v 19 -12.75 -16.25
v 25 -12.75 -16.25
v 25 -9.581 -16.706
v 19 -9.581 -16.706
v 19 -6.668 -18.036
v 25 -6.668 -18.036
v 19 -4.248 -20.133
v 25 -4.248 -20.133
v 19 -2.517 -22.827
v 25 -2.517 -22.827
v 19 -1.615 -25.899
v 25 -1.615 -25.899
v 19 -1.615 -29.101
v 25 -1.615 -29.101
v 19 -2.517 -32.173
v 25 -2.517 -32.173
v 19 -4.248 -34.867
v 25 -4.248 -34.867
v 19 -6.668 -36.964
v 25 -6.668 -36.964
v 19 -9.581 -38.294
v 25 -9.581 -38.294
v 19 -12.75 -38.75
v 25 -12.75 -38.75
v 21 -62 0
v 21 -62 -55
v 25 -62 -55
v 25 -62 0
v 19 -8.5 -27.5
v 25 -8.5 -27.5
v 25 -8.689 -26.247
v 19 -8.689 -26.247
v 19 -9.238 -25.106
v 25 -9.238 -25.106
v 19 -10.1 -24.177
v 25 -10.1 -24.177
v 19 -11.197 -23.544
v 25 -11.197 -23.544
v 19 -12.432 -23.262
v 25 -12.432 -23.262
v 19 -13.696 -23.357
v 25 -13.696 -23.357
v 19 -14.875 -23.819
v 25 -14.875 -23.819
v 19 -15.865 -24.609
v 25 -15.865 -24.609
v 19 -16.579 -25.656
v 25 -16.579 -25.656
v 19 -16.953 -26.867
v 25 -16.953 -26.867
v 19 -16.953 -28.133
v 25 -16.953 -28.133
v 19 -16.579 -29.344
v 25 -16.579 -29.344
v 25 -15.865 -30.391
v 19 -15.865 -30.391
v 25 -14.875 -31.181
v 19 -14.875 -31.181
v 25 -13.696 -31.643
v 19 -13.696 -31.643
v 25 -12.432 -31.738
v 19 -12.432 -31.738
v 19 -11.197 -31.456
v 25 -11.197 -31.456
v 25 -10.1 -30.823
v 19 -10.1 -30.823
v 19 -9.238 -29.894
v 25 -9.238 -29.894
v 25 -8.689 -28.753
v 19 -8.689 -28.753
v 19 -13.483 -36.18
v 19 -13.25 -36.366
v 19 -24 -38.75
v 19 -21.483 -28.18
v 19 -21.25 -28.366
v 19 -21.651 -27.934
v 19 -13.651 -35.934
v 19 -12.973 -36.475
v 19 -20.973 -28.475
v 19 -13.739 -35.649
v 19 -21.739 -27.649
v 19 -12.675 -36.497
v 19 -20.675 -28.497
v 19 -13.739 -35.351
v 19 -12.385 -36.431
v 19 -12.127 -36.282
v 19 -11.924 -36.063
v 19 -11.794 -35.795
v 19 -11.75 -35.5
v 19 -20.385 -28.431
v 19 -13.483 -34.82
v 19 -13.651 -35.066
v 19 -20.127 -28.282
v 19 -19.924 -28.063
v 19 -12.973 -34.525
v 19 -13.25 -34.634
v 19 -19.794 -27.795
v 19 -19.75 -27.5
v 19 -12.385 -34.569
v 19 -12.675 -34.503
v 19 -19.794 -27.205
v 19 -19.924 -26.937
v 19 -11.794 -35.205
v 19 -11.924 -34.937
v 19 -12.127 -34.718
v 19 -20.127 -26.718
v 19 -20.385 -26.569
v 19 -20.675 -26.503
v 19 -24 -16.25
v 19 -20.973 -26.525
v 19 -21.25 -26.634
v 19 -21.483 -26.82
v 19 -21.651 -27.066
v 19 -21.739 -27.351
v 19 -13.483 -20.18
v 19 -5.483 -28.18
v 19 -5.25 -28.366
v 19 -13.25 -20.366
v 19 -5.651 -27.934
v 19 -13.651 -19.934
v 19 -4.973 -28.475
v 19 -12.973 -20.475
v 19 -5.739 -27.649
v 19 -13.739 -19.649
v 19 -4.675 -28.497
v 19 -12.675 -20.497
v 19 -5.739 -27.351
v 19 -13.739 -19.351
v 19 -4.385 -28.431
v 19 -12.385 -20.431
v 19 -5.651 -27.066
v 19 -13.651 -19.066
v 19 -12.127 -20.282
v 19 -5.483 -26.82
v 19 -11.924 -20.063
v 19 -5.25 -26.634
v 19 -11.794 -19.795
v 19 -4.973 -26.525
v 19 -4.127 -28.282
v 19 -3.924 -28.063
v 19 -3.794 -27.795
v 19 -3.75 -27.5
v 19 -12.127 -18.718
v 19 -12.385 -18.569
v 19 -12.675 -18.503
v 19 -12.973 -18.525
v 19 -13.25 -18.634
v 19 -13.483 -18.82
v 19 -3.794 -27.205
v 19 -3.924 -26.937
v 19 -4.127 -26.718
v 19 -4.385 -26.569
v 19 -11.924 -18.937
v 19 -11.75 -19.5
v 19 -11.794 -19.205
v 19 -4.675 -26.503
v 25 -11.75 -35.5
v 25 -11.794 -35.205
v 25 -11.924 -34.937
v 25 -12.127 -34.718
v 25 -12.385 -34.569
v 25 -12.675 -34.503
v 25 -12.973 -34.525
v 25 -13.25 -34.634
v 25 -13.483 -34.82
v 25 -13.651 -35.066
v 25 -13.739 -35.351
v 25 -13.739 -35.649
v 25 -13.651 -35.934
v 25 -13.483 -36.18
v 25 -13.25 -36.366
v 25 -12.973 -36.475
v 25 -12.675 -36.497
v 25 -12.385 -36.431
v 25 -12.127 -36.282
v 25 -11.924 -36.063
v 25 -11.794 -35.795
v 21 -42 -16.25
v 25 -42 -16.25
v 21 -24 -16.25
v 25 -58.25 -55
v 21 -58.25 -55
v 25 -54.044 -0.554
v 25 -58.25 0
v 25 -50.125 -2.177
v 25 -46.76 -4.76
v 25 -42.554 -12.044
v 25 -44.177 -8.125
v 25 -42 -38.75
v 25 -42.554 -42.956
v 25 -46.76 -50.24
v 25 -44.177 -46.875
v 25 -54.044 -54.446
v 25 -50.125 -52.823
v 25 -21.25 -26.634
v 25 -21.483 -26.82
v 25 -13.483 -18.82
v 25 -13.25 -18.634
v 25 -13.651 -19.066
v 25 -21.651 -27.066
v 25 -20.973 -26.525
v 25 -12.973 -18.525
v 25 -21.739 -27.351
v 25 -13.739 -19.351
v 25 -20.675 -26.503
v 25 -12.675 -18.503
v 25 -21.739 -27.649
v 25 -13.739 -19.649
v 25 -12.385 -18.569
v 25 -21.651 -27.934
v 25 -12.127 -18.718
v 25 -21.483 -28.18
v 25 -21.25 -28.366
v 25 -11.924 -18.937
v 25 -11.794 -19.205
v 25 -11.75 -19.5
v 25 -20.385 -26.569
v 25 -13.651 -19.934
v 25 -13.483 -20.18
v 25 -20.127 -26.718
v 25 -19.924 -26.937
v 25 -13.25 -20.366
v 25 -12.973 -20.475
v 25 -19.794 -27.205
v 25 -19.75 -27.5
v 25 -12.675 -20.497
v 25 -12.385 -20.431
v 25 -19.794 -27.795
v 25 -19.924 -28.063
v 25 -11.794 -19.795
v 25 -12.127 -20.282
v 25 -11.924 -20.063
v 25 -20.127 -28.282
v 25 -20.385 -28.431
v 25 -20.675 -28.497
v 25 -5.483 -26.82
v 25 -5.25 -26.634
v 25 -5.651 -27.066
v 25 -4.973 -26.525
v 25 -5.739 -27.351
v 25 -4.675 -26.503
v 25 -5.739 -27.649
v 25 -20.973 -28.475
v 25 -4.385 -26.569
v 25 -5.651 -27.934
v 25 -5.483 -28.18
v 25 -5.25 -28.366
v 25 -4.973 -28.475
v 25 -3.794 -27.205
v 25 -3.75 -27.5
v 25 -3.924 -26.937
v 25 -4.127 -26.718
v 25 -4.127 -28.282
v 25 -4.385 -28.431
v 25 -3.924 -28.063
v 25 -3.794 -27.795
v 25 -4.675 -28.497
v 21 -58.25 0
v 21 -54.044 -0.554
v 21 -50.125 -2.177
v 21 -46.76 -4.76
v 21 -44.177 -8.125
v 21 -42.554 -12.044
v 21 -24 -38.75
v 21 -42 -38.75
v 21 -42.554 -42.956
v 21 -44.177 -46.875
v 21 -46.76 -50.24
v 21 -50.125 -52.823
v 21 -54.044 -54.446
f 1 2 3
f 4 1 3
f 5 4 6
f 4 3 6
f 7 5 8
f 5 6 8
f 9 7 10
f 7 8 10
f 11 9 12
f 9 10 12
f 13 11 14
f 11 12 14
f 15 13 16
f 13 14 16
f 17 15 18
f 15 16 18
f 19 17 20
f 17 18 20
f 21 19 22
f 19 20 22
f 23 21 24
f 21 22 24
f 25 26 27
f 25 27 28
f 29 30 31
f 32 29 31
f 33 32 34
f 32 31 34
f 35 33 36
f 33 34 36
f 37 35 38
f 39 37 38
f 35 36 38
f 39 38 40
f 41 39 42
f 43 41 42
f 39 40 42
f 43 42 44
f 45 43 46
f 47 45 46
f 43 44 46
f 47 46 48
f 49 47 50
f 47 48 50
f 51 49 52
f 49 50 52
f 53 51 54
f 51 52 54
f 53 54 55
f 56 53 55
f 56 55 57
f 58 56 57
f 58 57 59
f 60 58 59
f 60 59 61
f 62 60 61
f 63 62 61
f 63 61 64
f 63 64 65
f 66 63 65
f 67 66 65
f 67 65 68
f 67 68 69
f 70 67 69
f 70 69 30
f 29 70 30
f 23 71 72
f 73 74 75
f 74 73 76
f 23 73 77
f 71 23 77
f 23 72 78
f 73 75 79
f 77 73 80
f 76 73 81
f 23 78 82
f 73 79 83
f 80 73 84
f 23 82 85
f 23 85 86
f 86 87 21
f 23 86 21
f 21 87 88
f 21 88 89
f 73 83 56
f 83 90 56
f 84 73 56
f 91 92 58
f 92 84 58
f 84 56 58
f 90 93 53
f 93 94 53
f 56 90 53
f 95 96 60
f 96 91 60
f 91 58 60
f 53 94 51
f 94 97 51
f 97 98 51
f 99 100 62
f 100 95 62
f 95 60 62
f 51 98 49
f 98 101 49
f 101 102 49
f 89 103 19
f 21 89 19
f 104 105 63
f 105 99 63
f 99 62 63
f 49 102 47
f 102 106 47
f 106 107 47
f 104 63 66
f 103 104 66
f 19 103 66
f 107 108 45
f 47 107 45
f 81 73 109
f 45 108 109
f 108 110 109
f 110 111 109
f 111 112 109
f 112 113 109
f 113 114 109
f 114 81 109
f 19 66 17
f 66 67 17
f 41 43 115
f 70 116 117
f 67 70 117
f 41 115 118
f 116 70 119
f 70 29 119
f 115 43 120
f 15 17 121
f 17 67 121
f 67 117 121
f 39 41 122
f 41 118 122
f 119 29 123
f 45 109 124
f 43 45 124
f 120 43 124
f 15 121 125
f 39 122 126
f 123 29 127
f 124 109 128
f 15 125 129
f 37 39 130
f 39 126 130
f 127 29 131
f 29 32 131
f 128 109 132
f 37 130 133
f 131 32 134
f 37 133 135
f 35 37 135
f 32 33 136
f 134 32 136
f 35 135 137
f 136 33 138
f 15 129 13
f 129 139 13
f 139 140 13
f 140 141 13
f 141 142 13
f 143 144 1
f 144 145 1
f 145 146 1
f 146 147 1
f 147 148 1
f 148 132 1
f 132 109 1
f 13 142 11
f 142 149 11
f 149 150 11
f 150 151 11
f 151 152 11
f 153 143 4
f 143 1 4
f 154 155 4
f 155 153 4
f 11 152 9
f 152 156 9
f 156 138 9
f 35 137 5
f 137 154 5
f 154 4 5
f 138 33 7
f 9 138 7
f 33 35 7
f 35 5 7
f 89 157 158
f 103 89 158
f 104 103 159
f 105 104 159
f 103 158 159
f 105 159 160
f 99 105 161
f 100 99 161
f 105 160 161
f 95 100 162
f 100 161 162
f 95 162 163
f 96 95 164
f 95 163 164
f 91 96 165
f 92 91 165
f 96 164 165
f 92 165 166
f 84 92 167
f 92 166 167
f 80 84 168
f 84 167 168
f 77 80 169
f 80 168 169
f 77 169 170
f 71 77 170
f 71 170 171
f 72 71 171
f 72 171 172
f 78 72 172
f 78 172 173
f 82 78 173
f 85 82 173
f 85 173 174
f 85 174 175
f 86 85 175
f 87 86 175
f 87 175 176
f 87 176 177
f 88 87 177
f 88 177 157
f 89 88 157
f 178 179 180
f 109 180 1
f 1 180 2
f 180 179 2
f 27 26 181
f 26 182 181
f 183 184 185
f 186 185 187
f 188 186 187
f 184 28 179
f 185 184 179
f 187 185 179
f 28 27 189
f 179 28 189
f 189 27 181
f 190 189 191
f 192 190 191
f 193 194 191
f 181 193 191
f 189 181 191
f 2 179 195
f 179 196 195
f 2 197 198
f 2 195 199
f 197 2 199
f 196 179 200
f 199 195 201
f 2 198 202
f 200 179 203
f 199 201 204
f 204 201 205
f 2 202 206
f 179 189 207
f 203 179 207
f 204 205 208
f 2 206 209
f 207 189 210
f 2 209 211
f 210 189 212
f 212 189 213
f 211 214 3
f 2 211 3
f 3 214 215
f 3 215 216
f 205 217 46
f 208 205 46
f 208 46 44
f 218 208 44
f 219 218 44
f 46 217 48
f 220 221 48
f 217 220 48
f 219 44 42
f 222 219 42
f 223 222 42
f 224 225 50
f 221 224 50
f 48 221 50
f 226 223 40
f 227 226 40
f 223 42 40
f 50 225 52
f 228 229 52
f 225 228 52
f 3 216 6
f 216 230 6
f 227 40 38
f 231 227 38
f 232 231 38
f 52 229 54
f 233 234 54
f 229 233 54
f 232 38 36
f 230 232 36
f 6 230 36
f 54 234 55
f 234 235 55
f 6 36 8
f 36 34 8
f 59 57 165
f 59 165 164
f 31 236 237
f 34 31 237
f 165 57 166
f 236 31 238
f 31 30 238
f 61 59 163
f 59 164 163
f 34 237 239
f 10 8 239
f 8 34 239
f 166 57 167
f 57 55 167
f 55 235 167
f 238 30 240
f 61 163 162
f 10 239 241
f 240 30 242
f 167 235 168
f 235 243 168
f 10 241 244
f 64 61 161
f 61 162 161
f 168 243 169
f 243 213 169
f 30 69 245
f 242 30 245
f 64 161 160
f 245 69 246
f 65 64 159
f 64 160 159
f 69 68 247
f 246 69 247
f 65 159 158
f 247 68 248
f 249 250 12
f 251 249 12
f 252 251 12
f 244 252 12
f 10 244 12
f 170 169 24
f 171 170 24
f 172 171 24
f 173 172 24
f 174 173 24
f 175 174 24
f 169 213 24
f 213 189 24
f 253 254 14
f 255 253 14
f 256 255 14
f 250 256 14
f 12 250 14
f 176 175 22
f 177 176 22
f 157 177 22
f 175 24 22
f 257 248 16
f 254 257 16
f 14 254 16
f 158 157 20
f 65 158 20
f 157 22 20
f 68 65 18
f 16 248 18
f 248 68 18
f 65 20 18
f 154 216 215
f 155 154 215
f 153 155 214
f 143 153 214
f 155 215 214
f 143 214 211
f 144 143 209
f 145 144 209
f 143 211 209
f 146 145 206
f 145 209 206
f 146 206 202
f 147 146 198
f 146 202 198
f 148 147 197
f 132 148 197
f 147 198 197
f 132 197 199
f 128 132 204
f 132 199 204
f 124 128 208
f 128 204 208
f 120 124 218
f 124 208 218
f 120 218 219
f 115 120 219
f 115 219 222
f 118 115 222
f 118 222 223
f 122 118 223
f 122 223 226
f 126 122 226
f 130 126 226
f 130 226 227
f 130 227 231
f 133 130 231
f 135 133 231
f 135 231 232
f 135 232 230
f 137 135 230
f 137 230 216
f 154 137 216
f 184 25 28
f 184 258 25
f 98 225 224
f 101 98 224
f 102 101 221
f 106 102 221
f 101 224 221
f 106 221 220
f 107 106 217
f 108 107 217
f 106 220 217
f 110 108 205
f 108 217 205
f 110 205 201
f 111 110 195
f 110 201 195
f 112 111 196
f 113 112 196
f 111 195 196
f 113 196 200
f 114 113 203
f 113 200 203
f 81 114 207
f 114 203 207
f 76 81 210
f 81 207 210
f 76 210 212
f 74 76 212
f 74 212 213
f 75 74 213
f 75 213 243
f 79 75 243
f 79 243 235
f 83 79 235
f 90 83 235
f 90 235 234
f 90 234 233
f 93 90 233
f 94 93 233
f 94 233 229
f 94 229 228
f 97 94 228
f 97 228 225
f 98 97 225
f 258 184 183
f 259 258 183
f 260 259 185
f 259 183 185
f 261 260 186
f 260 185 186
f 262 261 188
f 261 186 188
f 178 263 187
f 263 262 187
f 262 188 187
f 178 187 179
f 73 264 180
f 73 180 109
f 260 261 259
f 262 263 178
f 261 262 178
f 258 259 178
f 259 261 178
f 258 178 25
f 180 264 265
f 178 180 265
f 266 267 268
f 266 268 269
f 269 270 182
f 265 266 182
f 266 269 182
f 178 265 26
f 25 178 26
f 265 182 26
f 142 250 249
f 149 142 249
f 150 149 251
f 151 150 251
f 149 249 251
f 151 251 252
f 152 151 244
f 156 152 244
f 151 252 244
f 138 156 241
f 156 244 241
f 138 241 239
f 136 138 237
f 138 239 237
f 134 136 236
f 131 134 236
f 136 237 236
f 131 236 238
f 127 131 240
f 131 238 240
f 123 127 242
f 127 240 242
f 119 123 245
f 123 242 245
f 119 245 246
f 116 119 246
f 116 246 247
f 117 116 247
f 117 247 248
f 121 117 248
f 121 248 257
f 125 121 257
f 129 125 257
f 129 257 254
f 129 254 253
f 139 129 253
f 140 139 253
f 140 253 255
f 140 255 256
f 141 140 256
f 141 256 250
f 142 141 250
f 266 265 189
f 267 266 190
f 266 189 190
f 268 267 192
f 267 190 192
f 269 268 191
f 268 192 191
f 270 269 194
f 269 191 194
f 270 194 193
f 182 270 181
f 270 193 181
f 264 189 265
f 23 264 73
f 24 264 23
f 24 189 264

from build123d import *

# Parameters (mm, degrees)
SKETCH1_W           = 50
SKETCH1_H           = 170
BOSS_EXTRUDE1_DEPTH = 55
SKETCH2_W           = 34
SKETCH2_H           = 27
CUT_EXTRUDE1_DEPTH  = 181.416185527
SKETCH3_W           = 10
SKETCH3_H           = 24
SKETCH3_R           = 4.25
SKETCH3_R_2         = 1
CUT_EXTRUDE2_DEPTH  = 186.539753153
SKETCH4_W           = 2
SKETCH4_H           = 24
CUT_EXTRUDE3_DEPTH  = 178.623196683
SKETCH5_W           = 6.25
SKETCH5_H           = 11.25
CUT_EXTRUDE4_DEPTH  = 186.539753153
SKETCH6_W           = 38
SKETCH6_H           = 10
CUT_EXTRUDE5_DEPTH  = 181.416185527
SKETCH8_W           = 13.25
SKETCH8_H           = 2.25
CUT_EXTRUDE7_DEPTH  = 186.539753153
SKETCH9_W           = 34
SKETCH9_H           = 35.25
CUT_EXTRUDE8_DEPTH  = 179.297679458
SKETCH11_W          = 13.25
SKETCH11_H          = 20.25
CUT_EXTRUDE9_DEPTH  = 184.480414486
SKETCH12_W          = 28.5
SKETCH12_H          = 15
BOSS_EXTRUDE2_DEPTH = 8
SKETCH14_W          = 34
SKETCH14_H          = 15
SKETCH14_H_2        = 10.25
BOSS_EXTRUDE3_DEPTH = 13.25
SKETCH16_R          = 4.5
SKETCH16_R_2        = 2.5
CUT_EXTRUDE13_DEPTH = 8
SKETCH17_W          = 16.25
SKETCH17_H          = 18
CUT_EXTRUDE14_DEPTH = 175.384811552
CUT_EXTRUDE15_DEPTH = 175.384811552
SKETCH20_W          = 42
SKETCH20_H          = 6.25
SKETCH20_H_2        = 18
SKETCH20_H_3        = 58.75
CUT_EXTRUDE18_DEPTH = 169.923244404
SKETCH22_R          = 4.5
SKETCH22_R_2        = 1.45
BOSS_EXTRUDE4_DEPTH = 8
SKETCH23_W          = 2
SKETCH23_H          = 10
CUT_EXTRUDE19_DEPTH = 165.352137193
FILLET1_R           = 10
SKETCH24_W          = 55
SKETCH24_H          = 55
CUT_EXTRUDE20_DEPTH = 175.384811552
SKETCH25_W          = 85.852144446
SKETCH25_H          = 76.221294909
CUT_EXTRUDE21_DEPTH = 175.384811552
SKETCH26_W          = 33.011757796
SKETCH26_H          = 68.674094685
CUT_EXTRUDE22_DEPTH = 87.567892431


with BuildPart() as part:
    # Sketch1 → Boss-Extrude1 (new body)
    with BuildSketch(Plane.XY):
        with Locations((0, -85)):
            Rectangle(SKETCH1_W, SKETCH1_H)
    extrude(amount=-BOSS_EXTRUDE1_DEPTH)

    # Sketch2 → Cut-Extrude1 (cut, through all)
    with BuildSketch(Plane.XY):
        with Locations((0, -13.5)):
            Rectangle(SKETCH2_W, SKETCH2_H)
    extrude(amount=-CUT_EXTRUDE1_DEPTH, mode=Mode.SUBTRACT)

    # Sketch3 → Cut-Extrude2 (cut, through all)
    with BuildSketch(Plane(origin=(25, 0, 0), x_dir=(0, 0, -1), z_dir=(1, 0, 0))):
        with Locations((50, -12)):
            Rectangle(SKETCH3_W, SKETCH3_H)
        with Locations((5, -12)):
            Rectangle(SKETCH3_W, SKETCH3_H)
        with Locations(Location((27.5, -12.75, 0), (0, 0, 90))):
            Circle(SKETCH3_R)
        with Locations(Location((35.5, -12.75, 0), (0, 0, 90))):
            Circle(SKETCH3_R_2)
        with Locations(Location((27.5, -4.75, 0), (0, 0, 90))):
            Circle(SKETCH3_R_2)
        with Locations(Location((27.5, -20.75, 0), (0, 0, 90))):
            Circle(SKETCH3_R_2)
        with Locations(Location((19.5, -12.75, 0), (0, 0, 90))):
            Circle(SKETCH3_R_2)
    extrude(amount=-CUT_EXTRUDE2_DEPTH, mode=Mode.SUBTRACT)

    # Sketch4 → Cut-Extrude3 (cut, through all)
    with BuildSketch(Plane.XY.offset(-10)):
        with Locations((-18, -12)):
            Rectangle(SKETCH4_W, SKETCH4_H)
        with Locations((18, -12)):
            Rectangle(SKETCH4_W, SKETCH4_H)
    extrude(amount=-CUT_EXTRUDE3_DEPTH, mode=Mode.SUBTRACT)

    # Sketch5 → Cut-Extrude4 (cut, through all)
    with BuildSketch(Plane(origin=(25, 0, 0), x_dir=(0, 0, -1), z_dir=(1, 0, 0))):
        with BuildLine():
            Line((45, 0), (10, 0))
            Line((10, 0), (10, -12.75))
            Line((10, -12.75), (16.25, -12.75))
            ThreePointArc((16.25, -12.75), (27.5, -1.5), (38.75, -12.75))
            Line((38.75, -12.75), (45, -12.75))
            Line((45, -12.75), (45, 0))
        make_face()
        with Locations((13.125, -18.375)):
            Rectangle(SKETCH5_W, SKETCH5_H)
        with Locations((41.875, -18.375)):
            Rectangle(SKETCH5_W, SKETCH5_H)
    extrude(amount=-CUT_EXTRUDE4_DEPTH, mode=Mode.SUBTRACT)

    # Sketch6 → Cut-Extrude5 (cut, through all)
    with BuildSketch(Plane.XY):
        with Locations((0, -29)):
            Rectangle(SKETCH6_W, SKETCH6_H)
    extrude(amount=-CUT_EXTRUDE5_DEPTH, mode=Mode.SUBTRACT)

    # Sketch8 → Cut-Extrude7 (cut, through all)
    with BuildSketch(Plane(origin=(25, 0, 0), x_dir=(0, 0, -1), z_dir=(1, 0, 0))):
        with BuildLine():
            Line((27.5, -157.5), (27.5, -132.5))
            Line((27.5, -132.5), (13.25, -132.5))
            Line((13.25, -132.5), (13.25, -167.75))
            Line((13.25, -167.75), (17.25, -167.75))
            ThreePointArc((17.25, -167.75), (20.252155493, -160.502155493), (27.5, -157.5))
        make_face()
        with BuildLine():
            Line((41.75, -167.75), (41.75, -132.5))
            Line((41.75, -132.5), (27.5, -132.5))
            Line((27.5, -132.5), (27.5, -157.5))
            ThreePointArc((27.5, -157.5), (34.747844507, -160.502155493), (37.75, -167.75))
            Line((37.75, -167.75), (41.75, -167.75))
        make_face()
        with Locations((48.375, -168.875)):
            Rectangle(SKETCH8_W, SKETCH8_H)
        with Locations((6.625, -168.875)):
            Rectangle(SKETCH8_W, SKETCH8_H)
        with BuildLine():
            Line((17.25, -167.75), (13.25, -167.75))
            Line((13.25, -167.75), (13.25, -170))
            Line((13.25, -170), (17.5, -170))
            ThreePointArc((17.5, -170), (17.31269172, -168.881923142), (17.25, -167.75))
        make_face()
        with BuildLine():
            Line((41.75, -170), (41.75, -167.75))
            Line((41.75, -167.75), (37.75, -167.75))
            ThreePointArc((37.75, -167.75), (37.68730828, -168.881923142), (37.5, -170))
            Line((37.5, -170), (41.75, -170))
        make_face()
        with BuildLine():
            Line((27.5, -167.75), (27.5, -157.5))
            ThreePointArc((27.5, -157.5), (20.252155493, -160.502155493), (17.25, -167.75))
            Line((17.25, -167.75), (27.5, -167.75))
        make_face()
        with BuildLine():
            ThreePointArc((37.75, -167.75), (34.747844507, -160.502155493), (27.5, -157.5))
            Line((27.5, -157.5), (27.5, -167.75))
            Line((27.5, -167.75), (37.75, -167.75))
        make_face()
        with BuildLine():
            Line((27.5, -170), (27.5, -167.75))
            Line((27.5, -167.75), (17.25, -167.75))
            ThreePointArc((17.25, -167.75), (17.31269172, -168.881923142), (17.5, -170))
            Line((17.5, -170), (27.5, -170))
        make_face()
        with BuildLine():
            ThreePointArc((37.5, -170), (37.68730828, -168.881923142), (37.75, -167.75))
            Line((37.75, -167.75), (27.5, -167.75))
            Line((27.5, -167.75), (27.5, -170))
            Line((27.5, -170), (37.5, -170))
        make_face()
    extrude(amount=-CUT_EXTRUDE7_DEPTH, mode=Mode.SUBTRACT)

    # Sketch9 → Cut-Extrude8 (cut, through all)
    with BuildSketch(Plane.XY):
        with Locations((0, -150.125)):
            Rectangle(SKETCH9_W, SKETCH9_H)
    extrude(amount=-CUT_EXTRUDE8_DEPTH, mode=Mode.SUBTRACT)

    # Sketch11 → Cut-Extrude9 (cut, through all)
    with BuildSketch(Plane(origin=(25, 0, 0), x_dir=(0, 0, -1), z_dir=(1, 0, 0))):
        with BuildLine():
            ThreePointArc((17.25, -167.75), (20.252155493, -160.502155493), (27.5, -157.5))
            Line((27.5, -157.5), (27.5, -147.5))
            Line((27.5, -147.5), (13.25, -147.5))
            Line((13.25, -147.5), (13.25, -167.75))
            Line((13.25, -167.75), (17.25, -167.75))
        make_face()
        with BuildLine():
            Line((27.5, -147.5), (27.5, -157.5))
            ThreePointArc((27.5, -157.5), (34.747844507, -160.502155493), (37.75, -167.75))
            Line((37.75, -167.75), (41.75, -167.75))
            Line((41.75, -167.75), (41.75, -147.5))
            Line((41.75, -147.5), (27.5, -147.5))
        make_face()
        with Locations((48.375, -157.625)):
            Rectangle(SKETCH11_W, SKETCH11_H)
        with Locations((6.625, -157.625)):
            Rectangle(SKETCH11_W, SKETCH11_H)
    extrude(amount=-CUT_EXTRUDE9_DEPTH, mode=Mode.SUBTRACT)

    # Sketch12 → Boss-Extrude2 (add)
    with BuildSketch(Plane(origin=(25, 0, 0), x_dir=(0, 0, -1), z_dir=(1, 0, 0))):
        with Locations((27.5, -140)):
            Rectangle(SKETCH12_W, SKETCH12_H)
    boss_extrude2 = extrude(amount=-BOSS_EXTRUDE2_DEPTH)

    # Mirror1: Boss-Extrude2 across plane
    add(boss_extrude2.mirror(Plane(origin=(0, 0, 0), x_dir=(0, 0, 1), z_dir=(1, 0, 0))))

    # Sketch14 → Boss-Extrude3 (add)
    with BuildSketch(Plane.XY):
        with Locations((0, -140)):
            Rectangle(SKETCH14_W, SKETCH14_H)
        with Locations((0, -152.625)):
            Rectangle(SKETCH14_W, SKETCH14_H_2)
    boss_extrude3 = extrude(amount=-BOSS_EXTRUDE3_DEPTH)

    # Mirror2: Boss-Extrude3 across plane
    add(boss_extrude3.mirror(Plane.XY.offset(-27.5)))

    # Sketch16 → Cut-Extrude13 (cut)
    # profile 1 of 3: a face of its own
    with BuildSketch(Plane(origin=(25, 0, 0), x_dir=(0, 0, -1), z_dir=(1, 0, 0))):
        with Locations(Location((16.5, -135.75, 0), (0, 0, 90))):
            Circle(SKETCH16_R)
        with Locations((16.5, -135.75)):
            Circle(SKETCH16_R_2, mode=Mode.SUBTRACT)
    # profile 2 of 3: a face of its own
    with BuildSketch(Plane(origin=(25, 0, 0), x_dir=(0, 0, -1), z_dir=(1, 0, 0))):
        with Locations((16.5, -135.75)):
            Circle(SKETCH16_R_2)
    # profile 3 of 3: a face of its own
    with BuildSketch(Plane(origin=(25, 0, 0), x_dir=(0, 0, -1), z_dir=(1, 0, 0))):
        with Locations(Location((38.5, -135.75, 0), (0, 0, 90))):
            Circle(SKETCH16_R)
    cut_extrude13 = extrude(amount=-CUT_EXTRUDE13_DEPTH, mode=Mode.SUBTRACT)

    # Mirror3: Cut-Extrude13 across plane
    add(cut_extrude13.mirror(Plane(origin=(0, 0, 0), x_dir=(0, 0, 1), z_dir=(1, 0, 0))), mode=Mode.SUBTRACT)

    # Sketch17 → Cut-Extrude14 (cut, through all)
    with BuildSketch(Plane(origin=(25, 0, 0), x_dir=(0, 0, -1), z_dir=(1, 0, 0))):
        with Locations((46.875, -33)):
            Rectangle(SKETCH17_W, SKETCH17_H)
        with Locations((8.125, -33)):
            Rectangle(SKETCH17_W, SKETCH17_H)
    extrude(amount=-CUT_EXTRUDE14_DEPTH, mode=Mode.SUBTRACT)

    # Sketch18 → Cut-Extrude15 (cut, through all)
    with BuildSketch(Plane(origin=(25, 0, 0), x_dir=(0, 0, -1), z_dir=(1, 0, 0))):
        with BuildLine():
            ThreePointArc((0, -58.25), (4.759514806, -46.759514806), (16.25, -42))
            Line((16.25, -42), (0, -42))
            Line((0, -42), (0, -58.25))
        make_face()
        with BuildLine():
            Line((55, -42), (38.75, -42))
            ThreePointArc((38.75, -42), (50.240485194, -46.759514806), (55, -58.25))
            Line((55, -58.25), (55, -42))
        make_face()
    extrude(amount=-CUT_EXTRUDE15_DEPTH, mode=Mode.SUBTRACT)

    # Sketch20 → Cut-Extrude18 (cut, through all)
    with BuildSketch(Plane(origin=(0, 0, -55), x_dir=(-1, 0, 0), z_dir=(0, 0, -1))):
        with Locations((0, -55.125)):
            Rectangle(SKETCH20_W, SKETCH20_H)
        with Locations((0, -43)):
            Rectangle(SKETCH20_W, SKETCH20_H_2)
        with Locations((0, -87.625)):
            Rectangle(SKETCH20_W, SKETCH20_H_3)
    extrude(amount=-CUT_EXTRUDE18_DEPTH, mode=Mode.SUBTRACT)

    # Sketch22 → Boss-Extrude4 (add)
    # profile 1 of 2: a face of its own
    with BuildSketch(Plane.ZY.offset(25)):
        with Locations(Location((-38.5, -135.75, 0), (0, 0, 90))):
            Circle(SKETCH22_R)
        with Locations(Location((-38.5, -135.75, 0), (0, 0, 270))):
            Circle(SKETCH22_R_2, mode=Mode.SUBTRACT)
    # profile 2 of 2: a face of its own
    with BuildSketch(Plane.ZY.offset(25)):
        with Locations(Location((-16.5, -135.75, 0), (0, 0, 90))):
            Circle(SKETCH22_R)
        with Locations(Location((-16.5, -135.75, 0), (0, 0, 270))):
            Circle(SKETCH22_R_2, mode=Mode.SUBTRACT)
    boss_extrude4 = extrude(amount=-BOSS_EXTRUDE4_DEPTH)

    # Mirror4: Boss-Extrude4 across plane
    add(boss_extrude4.mirror(Plane(origin=(0, 0, 0), x_dir=(0, 0, 1), z_dir=(1, 0, 0))))

    # Sketch23 → Cut-Extrude19 (cut, through all)
    with BuildSketch(Plane(origin=(0, 0, -38.75), x_dir=(-1, 0, 0), z_dir=(0, 0, -1))):
        with Locations((-20, -29)):
            Rectangle(SKETCH23_W, SKETCH23_H)
        with Locations((20, -29)):
            Rectangle(SKETCH23_W, SKETCH23_H)
    extrude(amount=-CUT_EXTRUDE19_DEPTH, mode=Mode.SUBTRACT)

    # Fillet1
    fillet1_edges = [part.edges().sort_by_distance(p)[0] for p in [
        (0, -157.75, 0),
        (0, -157.75, -55),
    ]]
    fillet(fillet1_edges, radius=FILLET1_R)

    # Sketch24 → Cut-Extrude20 (cut, through all)
    with BuildSketch(Plane.ZY.offset(25)):
        with Locations((-27.5, -89.5)):
            Rectangle(SKETCH24_W, SKETCH24_H)
    extrude(amount=-CUT_EXTRUDE20_DEPTH, mode=Mode.SUBTRACT)


with BuildPart() as cut_extrude20_piece_1:
    # of the separate pieces the step leaves, piece 1, a body of its own (cut_extrude20_pieces)
    add(part.part.solids().sort_by_distance((17, -147.75, 0))[0])

    # Sketch25 → Cut-Extrude21 (cut, through all)
    with BuildSketch(Plane.ZY.offset(25)):
        with Locations((-29.151002778, -129.567834029)):
            Rectangle(SKETCH25_W, SKETCH25_H)
    extrude(amount=-CUT_EXTRUDE21_DEPTH, mode=Mode.SUBTRACT)


with BuildPart() as cut_extrude20_piece_2:
    # of the separate pieces the step leaves, piece 2, a body of its own (cut_extrude20_pieces)
    add(part.part.solids().sort_by_distance((25, -58.25, 0))[0])


with BuildPart() as cut_extrude20_piece_3:
    # of the separate pieces the step leaves, piece 3, a body of its own (cut_extrude20_pieces)
    add(part.part.solids().sort_by_distance((-25, -62, 0))[0])

    # Sketch26 → Cut-Extrude22 (cut, through all)
    with BuildSketch(Plane.XY):
        with Locations((-19.418686116, -31.078989241)):
            Rectangle(SKETCH26_W, SKETCH26_H)
    extrude(amount=-CUT_EXTRUDE22_DEPTH, mode=Mode.SUBTRACT)


solid = cut_extrude20_piece_2.part
